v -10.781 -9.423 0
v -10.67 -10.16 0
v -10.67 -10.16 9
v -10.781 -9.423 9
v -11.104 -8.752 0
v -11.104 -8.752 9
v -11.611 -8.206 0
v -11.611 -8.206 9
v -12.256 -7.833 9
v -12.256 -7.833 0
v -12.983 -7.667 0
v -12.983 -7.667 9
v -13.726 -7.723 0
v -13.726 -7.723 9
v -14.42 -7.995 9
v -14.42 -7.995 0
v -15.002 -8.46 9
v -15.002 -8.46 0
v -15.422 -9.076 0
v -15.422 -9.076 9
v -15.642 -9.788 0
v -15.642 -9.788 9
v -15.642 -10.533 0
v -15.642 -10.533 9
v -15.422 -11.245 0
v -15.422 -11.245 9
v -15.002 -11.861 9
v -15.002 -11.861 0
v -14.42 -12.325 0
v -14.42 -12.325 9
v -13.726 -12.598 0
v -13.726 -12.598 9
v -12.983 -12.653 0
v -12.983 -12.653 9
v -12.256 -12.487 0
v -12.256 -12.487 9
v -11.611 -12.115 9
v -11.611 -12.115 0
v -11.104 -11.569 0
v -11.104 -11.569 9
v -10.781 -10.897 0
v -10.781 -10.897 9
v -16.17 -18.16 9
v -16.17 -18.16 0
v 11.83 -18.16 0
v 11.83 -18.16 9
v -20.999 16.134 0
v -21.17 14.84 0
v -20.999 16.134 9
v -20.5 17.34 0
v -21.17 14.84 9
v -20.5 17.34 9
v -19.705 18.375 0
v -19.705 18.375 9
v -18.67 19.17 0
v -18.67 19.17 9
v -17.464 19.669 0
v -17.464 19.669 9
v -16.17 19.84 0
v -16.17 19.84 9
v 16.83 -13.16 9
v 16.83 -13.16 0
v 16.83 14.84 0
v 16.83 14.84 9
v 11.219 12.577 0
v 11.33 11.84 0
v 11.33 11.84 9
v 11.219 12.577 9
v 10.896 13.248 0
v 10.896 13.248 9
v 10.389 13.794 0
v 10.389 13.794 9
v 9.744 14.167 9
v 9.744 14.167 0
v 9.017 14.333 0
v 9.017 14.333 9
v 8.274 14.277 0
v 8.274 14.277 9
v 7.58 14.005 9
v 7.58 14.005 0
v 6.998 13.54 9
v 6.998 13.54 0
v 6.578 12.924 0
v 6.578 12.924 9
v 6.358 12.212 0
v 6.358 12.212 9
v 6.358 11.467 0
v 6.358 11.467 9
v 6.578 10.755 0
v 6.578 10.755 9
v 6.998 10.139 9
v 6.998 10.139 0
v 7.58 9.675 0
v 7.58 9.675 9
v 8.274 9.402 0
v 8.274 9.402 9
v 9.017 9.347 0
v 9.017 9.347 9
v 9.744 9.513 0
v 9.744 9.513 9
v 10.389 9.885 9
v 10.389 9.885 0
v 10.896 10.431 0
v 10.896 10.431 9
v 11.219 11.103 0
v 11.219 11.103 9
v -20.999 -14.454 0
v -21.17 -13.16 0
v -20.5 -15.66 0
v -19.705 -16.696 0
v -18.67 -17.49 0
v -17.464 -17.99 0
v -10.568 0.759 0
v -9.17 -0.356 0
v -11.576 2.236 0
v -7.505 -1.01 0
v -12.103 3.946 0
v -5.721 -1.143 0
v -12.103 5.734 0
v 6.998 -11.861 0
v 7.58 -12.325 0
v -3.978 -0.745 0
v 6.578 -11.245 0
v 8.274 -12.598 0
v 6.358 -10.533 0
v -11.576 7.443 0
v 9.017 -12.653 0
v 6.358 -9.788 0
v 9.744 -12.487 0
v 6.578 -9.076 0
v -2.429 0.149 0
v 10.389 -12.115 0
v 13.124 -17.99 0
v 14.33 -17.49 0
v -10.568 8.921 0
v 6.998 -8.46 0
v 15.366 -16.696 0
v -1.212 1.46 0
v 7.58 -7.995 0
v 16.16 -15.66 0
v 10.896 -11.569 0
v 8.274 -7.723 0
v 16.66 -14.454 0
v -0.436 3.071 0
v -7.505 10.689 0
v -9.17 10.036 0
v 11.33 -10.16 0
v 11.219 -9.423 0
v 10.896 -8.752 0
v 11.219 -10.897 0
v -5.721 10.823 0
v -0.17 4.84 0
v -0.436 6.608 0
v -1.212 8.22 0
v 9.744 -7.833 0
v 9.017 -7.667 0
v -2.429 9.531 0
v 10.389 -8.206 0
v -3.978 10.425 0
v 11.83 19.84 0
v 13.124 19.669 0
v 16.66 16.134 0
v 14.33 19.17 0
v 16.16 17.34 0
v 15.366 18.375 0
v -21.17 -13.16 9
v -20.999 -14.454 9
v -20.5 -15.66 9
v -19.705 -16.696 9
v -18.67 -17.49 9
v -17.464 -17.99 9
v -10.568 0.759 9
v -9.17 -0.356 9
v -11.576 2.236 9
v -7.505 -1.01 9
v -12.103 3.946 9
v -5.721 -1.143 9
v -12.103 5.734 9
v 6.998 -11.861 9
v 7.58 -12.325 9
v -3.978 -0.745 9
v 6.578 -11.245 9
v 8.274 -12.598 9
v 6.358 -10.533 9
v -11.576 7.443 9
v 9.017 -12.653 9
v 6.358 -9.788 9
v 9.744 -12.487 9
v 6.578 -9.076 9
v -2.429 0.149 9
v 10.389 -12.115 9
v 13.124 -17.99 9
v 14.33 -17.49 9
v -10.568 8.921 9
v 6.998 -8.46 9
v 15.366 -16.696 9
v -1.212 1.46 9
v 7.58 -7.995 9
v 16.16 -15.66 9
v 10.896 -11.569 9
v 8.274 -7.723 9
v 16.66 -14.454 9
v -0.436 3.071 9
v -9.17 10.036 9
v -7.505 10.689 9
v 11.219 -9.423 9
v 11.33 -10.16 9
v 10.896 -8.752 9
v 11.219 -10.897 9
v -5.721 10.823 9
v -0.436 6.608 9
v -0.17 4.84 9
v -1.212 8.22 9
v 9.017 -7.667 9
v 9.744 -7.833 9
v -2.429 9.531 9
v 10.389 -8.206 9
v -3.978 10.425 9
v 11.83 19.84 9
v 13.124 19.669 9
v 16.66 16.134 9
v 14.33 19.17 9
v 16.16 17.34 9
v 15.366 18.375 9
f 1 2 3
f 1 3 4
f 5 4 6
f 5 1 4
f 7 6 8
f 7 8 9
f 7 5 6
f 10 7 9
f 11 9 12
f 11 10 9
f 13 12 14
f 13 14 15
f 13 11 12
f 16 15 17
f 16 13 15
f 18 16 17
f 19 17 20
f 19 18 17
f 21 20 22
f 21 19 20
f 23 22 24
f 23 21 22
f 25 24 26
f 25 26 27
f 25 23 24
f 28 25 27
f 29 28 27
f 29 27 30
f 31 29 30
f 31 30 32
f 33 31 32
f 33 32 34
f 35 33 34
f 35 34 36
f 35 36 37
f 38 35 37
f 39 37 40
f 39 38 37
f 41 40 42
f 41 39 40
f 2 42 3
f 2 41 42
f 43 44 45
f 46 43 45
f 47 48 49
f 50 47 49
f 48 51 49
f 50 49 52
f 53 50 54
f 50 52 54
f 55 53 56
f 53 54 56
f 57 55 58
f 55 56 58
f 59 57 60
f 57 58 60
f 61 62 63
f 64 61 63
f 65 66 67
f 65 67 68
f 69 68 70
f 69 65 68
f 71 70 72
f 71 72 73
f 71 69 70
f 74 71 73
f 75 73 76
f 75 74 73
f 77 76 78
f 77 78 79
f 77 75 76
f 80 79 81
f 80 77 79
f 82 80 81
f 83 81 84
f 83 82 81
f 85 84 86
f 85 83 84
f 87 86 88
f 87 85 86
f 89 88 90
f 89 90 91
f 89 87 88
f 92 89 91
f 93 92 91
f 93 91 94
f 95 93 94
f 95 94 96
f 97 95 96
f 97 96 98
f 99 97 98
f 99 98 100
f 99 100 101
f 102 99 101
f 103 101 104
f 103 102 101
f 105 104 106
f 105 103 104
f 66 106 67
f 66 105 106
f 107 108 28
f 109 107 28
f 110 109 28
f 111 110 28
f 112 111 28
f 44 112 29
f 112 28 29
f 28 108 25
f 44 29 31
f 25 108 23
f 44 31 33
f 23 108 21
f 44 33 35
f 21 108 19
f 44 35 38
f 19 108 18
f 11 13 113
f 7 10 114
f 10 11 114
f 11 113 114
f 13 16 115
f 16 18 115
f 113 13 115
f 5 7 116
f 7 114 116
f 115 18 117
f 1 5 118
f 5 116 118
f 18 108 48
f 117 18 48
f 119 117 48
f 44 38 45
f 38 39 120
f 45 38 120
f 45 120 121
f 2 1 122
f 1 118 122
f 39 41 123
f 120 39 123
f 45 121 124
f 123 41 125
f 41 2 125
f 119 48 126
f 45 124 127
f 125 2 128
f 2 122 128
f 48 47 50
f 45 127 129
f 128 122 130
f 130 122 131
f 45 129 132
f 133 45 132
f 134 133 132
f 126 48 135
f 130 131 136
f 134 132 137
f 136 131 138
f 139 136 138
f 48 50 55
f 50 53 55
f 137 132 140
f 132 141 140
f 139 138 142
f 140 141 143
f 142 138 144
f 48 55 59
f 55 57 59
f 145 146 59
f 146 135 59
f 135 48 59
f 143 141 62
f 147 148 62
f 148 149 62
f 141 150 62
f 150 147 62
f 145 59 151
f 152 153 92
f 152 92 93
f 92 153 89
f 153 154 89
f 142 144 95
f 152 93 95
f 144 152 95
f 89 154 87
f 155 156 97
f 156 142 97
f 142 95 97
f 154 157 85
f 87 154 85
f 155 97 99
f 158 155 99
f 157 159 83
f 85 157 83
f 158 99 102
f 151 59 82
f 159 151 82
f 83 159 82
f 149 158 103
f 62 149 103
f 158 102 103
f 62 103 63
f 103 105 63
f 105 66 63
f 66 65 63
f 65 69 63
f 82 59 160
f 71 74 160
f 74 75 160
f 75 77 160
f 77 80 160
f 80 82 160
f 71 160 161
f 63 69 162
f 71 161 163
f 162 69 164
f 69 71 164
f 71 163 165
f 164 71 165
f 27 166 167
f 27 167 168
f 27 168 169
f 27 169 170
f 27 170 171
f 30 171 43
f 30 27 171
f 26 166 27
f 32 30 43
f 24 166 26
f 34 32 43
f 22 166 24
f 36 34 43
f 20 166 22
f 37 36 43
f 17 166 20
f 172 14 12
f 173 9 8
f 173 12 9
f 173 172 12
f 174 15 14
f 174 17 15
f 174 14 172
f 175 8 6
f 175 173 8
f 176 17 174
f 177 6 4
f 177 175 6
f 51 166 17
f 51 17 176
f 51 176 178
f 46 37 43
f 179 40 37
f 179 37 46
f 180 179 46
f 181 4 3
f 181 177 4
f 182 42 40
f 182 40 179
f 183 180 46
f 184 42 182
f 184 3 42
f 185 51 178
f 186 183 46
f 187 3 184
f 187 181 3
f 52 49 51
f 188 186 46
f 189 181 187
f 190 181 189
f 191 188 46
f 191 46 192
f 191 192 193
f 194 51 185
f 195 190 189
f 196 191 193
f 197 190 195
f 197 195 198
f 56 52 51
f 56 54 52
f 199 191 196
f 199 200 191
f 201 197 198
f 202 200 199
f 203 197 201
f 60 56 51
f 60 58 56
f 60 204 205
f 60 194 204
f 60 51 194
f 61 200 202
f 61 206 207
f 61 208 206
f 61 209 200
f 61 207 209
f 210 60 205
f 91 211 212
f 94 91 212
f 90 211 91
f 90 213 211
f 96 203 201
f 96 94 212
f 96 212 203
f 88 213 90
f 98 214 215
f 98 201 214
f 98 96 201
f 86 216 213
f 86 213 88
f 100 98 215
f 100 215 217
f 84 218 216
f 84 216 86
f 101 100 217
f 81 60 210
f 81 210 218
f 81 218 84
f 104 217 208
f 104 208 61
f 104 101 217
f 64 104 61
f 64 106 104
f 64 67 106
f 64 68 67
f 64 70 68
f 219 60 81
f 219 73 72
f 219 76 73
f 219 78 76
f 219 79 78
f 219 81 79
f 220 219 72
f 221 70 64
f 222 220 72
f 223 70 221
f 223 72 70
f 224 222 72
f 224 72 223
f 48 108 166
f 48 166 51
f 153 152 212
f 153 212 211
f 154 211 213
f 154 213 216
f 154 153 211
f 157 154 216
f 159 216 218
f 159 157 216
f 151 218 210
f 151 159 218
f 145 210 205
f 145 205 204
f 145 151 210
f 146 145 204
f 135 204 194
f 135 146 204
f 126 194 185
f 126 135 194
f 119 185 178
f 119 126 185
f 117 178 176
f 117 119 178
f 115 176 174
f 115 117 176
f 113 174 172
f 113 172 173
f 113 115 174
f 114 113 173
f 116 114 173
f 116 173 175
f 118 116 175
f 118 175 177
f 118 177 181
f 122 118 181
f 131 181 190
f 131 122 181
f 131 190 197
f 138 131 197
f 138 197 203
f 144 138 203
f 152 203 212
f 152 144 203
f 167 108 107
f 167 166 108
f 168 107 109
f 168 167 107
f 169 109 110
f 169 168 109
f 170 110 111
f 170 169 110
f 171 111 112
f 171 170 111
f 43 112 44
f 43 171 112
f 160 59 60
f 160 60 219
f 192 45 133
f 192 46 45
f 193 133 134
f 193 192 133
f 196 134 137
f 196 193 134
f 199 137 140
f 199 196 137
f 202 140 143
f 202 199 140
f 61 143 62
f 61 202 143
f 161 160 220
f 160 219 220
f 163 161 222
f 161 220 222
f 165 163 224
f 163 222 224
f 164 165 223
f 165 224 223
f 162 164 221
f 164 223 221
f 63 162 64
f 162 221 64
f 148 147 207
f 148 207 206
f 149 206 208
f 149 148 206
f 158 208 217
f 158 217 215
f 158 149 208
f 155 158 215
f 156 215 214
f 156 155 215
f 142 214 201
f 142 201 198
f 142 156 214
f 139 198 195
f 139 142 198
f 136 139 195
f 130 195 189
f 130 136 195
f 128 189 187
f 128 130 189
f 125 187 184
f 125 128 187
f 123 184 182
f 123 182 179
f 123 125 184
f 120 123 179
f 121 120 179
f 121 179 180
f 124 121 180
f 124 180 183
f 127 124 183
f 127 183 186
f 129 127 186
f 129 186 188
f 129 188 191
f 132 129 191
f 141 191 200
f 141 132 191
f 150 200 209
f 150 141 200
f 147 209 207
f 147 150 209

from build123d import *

# Parameters (mm, degrees)
SKETCH_1_W      = 38
SKETCH_1_H      = 38
SKETCH_1_R      = 2.5
SKETCH_1_R_2    = 6
EXTRUDE_1_DEPTH = 9
FILLET_1_R      = 5


with BuildPart() as part:
    # 草图1 → 凸台-拉伸1 (new body)
    with BuildSketch(Plane.XY):
        with Locations((-2.169799589, 0.839779006)):
            Rectangle(SKETCH_1_W, SKETCH_1_H)
        with Locations((8.830200411, 11.839779006)):
            Circle(SKETCH_1_R, mode=Mode.SUBTRACT)
        with Locations((8.830200411, -10.160220994)):
            Circle(SKETCH_1_R, mode=Mode.SUBTRACT)
        with Locations((-13.169799589, -10.160220994)):
            Circle(SKETCH_1_R, mode=Mode.SUBTRACT)
        with Locations((-6.169799589, 4.839779006)):
            Circle(SKETCH_1_R_2, mode=Mode.SUBTRACT)
    extrude(amount=EXTRUDE_1_DEPTH)

    # 圆角1
    fillet_1_edges = [part.edges().sort_by_distance(p)[0] for p in [
        (-21.169799589, 19.839779006, 4.5),
        (16.830200411, 19.839779006, 4.5),
        (16.830200411, -18.160220994, 4.5),
        (-21.169799589, -18.160220994, 4.5),
    ]]
    fillet(fillet_1_edges, radius=FILLET_1_R)


solid = part.part
